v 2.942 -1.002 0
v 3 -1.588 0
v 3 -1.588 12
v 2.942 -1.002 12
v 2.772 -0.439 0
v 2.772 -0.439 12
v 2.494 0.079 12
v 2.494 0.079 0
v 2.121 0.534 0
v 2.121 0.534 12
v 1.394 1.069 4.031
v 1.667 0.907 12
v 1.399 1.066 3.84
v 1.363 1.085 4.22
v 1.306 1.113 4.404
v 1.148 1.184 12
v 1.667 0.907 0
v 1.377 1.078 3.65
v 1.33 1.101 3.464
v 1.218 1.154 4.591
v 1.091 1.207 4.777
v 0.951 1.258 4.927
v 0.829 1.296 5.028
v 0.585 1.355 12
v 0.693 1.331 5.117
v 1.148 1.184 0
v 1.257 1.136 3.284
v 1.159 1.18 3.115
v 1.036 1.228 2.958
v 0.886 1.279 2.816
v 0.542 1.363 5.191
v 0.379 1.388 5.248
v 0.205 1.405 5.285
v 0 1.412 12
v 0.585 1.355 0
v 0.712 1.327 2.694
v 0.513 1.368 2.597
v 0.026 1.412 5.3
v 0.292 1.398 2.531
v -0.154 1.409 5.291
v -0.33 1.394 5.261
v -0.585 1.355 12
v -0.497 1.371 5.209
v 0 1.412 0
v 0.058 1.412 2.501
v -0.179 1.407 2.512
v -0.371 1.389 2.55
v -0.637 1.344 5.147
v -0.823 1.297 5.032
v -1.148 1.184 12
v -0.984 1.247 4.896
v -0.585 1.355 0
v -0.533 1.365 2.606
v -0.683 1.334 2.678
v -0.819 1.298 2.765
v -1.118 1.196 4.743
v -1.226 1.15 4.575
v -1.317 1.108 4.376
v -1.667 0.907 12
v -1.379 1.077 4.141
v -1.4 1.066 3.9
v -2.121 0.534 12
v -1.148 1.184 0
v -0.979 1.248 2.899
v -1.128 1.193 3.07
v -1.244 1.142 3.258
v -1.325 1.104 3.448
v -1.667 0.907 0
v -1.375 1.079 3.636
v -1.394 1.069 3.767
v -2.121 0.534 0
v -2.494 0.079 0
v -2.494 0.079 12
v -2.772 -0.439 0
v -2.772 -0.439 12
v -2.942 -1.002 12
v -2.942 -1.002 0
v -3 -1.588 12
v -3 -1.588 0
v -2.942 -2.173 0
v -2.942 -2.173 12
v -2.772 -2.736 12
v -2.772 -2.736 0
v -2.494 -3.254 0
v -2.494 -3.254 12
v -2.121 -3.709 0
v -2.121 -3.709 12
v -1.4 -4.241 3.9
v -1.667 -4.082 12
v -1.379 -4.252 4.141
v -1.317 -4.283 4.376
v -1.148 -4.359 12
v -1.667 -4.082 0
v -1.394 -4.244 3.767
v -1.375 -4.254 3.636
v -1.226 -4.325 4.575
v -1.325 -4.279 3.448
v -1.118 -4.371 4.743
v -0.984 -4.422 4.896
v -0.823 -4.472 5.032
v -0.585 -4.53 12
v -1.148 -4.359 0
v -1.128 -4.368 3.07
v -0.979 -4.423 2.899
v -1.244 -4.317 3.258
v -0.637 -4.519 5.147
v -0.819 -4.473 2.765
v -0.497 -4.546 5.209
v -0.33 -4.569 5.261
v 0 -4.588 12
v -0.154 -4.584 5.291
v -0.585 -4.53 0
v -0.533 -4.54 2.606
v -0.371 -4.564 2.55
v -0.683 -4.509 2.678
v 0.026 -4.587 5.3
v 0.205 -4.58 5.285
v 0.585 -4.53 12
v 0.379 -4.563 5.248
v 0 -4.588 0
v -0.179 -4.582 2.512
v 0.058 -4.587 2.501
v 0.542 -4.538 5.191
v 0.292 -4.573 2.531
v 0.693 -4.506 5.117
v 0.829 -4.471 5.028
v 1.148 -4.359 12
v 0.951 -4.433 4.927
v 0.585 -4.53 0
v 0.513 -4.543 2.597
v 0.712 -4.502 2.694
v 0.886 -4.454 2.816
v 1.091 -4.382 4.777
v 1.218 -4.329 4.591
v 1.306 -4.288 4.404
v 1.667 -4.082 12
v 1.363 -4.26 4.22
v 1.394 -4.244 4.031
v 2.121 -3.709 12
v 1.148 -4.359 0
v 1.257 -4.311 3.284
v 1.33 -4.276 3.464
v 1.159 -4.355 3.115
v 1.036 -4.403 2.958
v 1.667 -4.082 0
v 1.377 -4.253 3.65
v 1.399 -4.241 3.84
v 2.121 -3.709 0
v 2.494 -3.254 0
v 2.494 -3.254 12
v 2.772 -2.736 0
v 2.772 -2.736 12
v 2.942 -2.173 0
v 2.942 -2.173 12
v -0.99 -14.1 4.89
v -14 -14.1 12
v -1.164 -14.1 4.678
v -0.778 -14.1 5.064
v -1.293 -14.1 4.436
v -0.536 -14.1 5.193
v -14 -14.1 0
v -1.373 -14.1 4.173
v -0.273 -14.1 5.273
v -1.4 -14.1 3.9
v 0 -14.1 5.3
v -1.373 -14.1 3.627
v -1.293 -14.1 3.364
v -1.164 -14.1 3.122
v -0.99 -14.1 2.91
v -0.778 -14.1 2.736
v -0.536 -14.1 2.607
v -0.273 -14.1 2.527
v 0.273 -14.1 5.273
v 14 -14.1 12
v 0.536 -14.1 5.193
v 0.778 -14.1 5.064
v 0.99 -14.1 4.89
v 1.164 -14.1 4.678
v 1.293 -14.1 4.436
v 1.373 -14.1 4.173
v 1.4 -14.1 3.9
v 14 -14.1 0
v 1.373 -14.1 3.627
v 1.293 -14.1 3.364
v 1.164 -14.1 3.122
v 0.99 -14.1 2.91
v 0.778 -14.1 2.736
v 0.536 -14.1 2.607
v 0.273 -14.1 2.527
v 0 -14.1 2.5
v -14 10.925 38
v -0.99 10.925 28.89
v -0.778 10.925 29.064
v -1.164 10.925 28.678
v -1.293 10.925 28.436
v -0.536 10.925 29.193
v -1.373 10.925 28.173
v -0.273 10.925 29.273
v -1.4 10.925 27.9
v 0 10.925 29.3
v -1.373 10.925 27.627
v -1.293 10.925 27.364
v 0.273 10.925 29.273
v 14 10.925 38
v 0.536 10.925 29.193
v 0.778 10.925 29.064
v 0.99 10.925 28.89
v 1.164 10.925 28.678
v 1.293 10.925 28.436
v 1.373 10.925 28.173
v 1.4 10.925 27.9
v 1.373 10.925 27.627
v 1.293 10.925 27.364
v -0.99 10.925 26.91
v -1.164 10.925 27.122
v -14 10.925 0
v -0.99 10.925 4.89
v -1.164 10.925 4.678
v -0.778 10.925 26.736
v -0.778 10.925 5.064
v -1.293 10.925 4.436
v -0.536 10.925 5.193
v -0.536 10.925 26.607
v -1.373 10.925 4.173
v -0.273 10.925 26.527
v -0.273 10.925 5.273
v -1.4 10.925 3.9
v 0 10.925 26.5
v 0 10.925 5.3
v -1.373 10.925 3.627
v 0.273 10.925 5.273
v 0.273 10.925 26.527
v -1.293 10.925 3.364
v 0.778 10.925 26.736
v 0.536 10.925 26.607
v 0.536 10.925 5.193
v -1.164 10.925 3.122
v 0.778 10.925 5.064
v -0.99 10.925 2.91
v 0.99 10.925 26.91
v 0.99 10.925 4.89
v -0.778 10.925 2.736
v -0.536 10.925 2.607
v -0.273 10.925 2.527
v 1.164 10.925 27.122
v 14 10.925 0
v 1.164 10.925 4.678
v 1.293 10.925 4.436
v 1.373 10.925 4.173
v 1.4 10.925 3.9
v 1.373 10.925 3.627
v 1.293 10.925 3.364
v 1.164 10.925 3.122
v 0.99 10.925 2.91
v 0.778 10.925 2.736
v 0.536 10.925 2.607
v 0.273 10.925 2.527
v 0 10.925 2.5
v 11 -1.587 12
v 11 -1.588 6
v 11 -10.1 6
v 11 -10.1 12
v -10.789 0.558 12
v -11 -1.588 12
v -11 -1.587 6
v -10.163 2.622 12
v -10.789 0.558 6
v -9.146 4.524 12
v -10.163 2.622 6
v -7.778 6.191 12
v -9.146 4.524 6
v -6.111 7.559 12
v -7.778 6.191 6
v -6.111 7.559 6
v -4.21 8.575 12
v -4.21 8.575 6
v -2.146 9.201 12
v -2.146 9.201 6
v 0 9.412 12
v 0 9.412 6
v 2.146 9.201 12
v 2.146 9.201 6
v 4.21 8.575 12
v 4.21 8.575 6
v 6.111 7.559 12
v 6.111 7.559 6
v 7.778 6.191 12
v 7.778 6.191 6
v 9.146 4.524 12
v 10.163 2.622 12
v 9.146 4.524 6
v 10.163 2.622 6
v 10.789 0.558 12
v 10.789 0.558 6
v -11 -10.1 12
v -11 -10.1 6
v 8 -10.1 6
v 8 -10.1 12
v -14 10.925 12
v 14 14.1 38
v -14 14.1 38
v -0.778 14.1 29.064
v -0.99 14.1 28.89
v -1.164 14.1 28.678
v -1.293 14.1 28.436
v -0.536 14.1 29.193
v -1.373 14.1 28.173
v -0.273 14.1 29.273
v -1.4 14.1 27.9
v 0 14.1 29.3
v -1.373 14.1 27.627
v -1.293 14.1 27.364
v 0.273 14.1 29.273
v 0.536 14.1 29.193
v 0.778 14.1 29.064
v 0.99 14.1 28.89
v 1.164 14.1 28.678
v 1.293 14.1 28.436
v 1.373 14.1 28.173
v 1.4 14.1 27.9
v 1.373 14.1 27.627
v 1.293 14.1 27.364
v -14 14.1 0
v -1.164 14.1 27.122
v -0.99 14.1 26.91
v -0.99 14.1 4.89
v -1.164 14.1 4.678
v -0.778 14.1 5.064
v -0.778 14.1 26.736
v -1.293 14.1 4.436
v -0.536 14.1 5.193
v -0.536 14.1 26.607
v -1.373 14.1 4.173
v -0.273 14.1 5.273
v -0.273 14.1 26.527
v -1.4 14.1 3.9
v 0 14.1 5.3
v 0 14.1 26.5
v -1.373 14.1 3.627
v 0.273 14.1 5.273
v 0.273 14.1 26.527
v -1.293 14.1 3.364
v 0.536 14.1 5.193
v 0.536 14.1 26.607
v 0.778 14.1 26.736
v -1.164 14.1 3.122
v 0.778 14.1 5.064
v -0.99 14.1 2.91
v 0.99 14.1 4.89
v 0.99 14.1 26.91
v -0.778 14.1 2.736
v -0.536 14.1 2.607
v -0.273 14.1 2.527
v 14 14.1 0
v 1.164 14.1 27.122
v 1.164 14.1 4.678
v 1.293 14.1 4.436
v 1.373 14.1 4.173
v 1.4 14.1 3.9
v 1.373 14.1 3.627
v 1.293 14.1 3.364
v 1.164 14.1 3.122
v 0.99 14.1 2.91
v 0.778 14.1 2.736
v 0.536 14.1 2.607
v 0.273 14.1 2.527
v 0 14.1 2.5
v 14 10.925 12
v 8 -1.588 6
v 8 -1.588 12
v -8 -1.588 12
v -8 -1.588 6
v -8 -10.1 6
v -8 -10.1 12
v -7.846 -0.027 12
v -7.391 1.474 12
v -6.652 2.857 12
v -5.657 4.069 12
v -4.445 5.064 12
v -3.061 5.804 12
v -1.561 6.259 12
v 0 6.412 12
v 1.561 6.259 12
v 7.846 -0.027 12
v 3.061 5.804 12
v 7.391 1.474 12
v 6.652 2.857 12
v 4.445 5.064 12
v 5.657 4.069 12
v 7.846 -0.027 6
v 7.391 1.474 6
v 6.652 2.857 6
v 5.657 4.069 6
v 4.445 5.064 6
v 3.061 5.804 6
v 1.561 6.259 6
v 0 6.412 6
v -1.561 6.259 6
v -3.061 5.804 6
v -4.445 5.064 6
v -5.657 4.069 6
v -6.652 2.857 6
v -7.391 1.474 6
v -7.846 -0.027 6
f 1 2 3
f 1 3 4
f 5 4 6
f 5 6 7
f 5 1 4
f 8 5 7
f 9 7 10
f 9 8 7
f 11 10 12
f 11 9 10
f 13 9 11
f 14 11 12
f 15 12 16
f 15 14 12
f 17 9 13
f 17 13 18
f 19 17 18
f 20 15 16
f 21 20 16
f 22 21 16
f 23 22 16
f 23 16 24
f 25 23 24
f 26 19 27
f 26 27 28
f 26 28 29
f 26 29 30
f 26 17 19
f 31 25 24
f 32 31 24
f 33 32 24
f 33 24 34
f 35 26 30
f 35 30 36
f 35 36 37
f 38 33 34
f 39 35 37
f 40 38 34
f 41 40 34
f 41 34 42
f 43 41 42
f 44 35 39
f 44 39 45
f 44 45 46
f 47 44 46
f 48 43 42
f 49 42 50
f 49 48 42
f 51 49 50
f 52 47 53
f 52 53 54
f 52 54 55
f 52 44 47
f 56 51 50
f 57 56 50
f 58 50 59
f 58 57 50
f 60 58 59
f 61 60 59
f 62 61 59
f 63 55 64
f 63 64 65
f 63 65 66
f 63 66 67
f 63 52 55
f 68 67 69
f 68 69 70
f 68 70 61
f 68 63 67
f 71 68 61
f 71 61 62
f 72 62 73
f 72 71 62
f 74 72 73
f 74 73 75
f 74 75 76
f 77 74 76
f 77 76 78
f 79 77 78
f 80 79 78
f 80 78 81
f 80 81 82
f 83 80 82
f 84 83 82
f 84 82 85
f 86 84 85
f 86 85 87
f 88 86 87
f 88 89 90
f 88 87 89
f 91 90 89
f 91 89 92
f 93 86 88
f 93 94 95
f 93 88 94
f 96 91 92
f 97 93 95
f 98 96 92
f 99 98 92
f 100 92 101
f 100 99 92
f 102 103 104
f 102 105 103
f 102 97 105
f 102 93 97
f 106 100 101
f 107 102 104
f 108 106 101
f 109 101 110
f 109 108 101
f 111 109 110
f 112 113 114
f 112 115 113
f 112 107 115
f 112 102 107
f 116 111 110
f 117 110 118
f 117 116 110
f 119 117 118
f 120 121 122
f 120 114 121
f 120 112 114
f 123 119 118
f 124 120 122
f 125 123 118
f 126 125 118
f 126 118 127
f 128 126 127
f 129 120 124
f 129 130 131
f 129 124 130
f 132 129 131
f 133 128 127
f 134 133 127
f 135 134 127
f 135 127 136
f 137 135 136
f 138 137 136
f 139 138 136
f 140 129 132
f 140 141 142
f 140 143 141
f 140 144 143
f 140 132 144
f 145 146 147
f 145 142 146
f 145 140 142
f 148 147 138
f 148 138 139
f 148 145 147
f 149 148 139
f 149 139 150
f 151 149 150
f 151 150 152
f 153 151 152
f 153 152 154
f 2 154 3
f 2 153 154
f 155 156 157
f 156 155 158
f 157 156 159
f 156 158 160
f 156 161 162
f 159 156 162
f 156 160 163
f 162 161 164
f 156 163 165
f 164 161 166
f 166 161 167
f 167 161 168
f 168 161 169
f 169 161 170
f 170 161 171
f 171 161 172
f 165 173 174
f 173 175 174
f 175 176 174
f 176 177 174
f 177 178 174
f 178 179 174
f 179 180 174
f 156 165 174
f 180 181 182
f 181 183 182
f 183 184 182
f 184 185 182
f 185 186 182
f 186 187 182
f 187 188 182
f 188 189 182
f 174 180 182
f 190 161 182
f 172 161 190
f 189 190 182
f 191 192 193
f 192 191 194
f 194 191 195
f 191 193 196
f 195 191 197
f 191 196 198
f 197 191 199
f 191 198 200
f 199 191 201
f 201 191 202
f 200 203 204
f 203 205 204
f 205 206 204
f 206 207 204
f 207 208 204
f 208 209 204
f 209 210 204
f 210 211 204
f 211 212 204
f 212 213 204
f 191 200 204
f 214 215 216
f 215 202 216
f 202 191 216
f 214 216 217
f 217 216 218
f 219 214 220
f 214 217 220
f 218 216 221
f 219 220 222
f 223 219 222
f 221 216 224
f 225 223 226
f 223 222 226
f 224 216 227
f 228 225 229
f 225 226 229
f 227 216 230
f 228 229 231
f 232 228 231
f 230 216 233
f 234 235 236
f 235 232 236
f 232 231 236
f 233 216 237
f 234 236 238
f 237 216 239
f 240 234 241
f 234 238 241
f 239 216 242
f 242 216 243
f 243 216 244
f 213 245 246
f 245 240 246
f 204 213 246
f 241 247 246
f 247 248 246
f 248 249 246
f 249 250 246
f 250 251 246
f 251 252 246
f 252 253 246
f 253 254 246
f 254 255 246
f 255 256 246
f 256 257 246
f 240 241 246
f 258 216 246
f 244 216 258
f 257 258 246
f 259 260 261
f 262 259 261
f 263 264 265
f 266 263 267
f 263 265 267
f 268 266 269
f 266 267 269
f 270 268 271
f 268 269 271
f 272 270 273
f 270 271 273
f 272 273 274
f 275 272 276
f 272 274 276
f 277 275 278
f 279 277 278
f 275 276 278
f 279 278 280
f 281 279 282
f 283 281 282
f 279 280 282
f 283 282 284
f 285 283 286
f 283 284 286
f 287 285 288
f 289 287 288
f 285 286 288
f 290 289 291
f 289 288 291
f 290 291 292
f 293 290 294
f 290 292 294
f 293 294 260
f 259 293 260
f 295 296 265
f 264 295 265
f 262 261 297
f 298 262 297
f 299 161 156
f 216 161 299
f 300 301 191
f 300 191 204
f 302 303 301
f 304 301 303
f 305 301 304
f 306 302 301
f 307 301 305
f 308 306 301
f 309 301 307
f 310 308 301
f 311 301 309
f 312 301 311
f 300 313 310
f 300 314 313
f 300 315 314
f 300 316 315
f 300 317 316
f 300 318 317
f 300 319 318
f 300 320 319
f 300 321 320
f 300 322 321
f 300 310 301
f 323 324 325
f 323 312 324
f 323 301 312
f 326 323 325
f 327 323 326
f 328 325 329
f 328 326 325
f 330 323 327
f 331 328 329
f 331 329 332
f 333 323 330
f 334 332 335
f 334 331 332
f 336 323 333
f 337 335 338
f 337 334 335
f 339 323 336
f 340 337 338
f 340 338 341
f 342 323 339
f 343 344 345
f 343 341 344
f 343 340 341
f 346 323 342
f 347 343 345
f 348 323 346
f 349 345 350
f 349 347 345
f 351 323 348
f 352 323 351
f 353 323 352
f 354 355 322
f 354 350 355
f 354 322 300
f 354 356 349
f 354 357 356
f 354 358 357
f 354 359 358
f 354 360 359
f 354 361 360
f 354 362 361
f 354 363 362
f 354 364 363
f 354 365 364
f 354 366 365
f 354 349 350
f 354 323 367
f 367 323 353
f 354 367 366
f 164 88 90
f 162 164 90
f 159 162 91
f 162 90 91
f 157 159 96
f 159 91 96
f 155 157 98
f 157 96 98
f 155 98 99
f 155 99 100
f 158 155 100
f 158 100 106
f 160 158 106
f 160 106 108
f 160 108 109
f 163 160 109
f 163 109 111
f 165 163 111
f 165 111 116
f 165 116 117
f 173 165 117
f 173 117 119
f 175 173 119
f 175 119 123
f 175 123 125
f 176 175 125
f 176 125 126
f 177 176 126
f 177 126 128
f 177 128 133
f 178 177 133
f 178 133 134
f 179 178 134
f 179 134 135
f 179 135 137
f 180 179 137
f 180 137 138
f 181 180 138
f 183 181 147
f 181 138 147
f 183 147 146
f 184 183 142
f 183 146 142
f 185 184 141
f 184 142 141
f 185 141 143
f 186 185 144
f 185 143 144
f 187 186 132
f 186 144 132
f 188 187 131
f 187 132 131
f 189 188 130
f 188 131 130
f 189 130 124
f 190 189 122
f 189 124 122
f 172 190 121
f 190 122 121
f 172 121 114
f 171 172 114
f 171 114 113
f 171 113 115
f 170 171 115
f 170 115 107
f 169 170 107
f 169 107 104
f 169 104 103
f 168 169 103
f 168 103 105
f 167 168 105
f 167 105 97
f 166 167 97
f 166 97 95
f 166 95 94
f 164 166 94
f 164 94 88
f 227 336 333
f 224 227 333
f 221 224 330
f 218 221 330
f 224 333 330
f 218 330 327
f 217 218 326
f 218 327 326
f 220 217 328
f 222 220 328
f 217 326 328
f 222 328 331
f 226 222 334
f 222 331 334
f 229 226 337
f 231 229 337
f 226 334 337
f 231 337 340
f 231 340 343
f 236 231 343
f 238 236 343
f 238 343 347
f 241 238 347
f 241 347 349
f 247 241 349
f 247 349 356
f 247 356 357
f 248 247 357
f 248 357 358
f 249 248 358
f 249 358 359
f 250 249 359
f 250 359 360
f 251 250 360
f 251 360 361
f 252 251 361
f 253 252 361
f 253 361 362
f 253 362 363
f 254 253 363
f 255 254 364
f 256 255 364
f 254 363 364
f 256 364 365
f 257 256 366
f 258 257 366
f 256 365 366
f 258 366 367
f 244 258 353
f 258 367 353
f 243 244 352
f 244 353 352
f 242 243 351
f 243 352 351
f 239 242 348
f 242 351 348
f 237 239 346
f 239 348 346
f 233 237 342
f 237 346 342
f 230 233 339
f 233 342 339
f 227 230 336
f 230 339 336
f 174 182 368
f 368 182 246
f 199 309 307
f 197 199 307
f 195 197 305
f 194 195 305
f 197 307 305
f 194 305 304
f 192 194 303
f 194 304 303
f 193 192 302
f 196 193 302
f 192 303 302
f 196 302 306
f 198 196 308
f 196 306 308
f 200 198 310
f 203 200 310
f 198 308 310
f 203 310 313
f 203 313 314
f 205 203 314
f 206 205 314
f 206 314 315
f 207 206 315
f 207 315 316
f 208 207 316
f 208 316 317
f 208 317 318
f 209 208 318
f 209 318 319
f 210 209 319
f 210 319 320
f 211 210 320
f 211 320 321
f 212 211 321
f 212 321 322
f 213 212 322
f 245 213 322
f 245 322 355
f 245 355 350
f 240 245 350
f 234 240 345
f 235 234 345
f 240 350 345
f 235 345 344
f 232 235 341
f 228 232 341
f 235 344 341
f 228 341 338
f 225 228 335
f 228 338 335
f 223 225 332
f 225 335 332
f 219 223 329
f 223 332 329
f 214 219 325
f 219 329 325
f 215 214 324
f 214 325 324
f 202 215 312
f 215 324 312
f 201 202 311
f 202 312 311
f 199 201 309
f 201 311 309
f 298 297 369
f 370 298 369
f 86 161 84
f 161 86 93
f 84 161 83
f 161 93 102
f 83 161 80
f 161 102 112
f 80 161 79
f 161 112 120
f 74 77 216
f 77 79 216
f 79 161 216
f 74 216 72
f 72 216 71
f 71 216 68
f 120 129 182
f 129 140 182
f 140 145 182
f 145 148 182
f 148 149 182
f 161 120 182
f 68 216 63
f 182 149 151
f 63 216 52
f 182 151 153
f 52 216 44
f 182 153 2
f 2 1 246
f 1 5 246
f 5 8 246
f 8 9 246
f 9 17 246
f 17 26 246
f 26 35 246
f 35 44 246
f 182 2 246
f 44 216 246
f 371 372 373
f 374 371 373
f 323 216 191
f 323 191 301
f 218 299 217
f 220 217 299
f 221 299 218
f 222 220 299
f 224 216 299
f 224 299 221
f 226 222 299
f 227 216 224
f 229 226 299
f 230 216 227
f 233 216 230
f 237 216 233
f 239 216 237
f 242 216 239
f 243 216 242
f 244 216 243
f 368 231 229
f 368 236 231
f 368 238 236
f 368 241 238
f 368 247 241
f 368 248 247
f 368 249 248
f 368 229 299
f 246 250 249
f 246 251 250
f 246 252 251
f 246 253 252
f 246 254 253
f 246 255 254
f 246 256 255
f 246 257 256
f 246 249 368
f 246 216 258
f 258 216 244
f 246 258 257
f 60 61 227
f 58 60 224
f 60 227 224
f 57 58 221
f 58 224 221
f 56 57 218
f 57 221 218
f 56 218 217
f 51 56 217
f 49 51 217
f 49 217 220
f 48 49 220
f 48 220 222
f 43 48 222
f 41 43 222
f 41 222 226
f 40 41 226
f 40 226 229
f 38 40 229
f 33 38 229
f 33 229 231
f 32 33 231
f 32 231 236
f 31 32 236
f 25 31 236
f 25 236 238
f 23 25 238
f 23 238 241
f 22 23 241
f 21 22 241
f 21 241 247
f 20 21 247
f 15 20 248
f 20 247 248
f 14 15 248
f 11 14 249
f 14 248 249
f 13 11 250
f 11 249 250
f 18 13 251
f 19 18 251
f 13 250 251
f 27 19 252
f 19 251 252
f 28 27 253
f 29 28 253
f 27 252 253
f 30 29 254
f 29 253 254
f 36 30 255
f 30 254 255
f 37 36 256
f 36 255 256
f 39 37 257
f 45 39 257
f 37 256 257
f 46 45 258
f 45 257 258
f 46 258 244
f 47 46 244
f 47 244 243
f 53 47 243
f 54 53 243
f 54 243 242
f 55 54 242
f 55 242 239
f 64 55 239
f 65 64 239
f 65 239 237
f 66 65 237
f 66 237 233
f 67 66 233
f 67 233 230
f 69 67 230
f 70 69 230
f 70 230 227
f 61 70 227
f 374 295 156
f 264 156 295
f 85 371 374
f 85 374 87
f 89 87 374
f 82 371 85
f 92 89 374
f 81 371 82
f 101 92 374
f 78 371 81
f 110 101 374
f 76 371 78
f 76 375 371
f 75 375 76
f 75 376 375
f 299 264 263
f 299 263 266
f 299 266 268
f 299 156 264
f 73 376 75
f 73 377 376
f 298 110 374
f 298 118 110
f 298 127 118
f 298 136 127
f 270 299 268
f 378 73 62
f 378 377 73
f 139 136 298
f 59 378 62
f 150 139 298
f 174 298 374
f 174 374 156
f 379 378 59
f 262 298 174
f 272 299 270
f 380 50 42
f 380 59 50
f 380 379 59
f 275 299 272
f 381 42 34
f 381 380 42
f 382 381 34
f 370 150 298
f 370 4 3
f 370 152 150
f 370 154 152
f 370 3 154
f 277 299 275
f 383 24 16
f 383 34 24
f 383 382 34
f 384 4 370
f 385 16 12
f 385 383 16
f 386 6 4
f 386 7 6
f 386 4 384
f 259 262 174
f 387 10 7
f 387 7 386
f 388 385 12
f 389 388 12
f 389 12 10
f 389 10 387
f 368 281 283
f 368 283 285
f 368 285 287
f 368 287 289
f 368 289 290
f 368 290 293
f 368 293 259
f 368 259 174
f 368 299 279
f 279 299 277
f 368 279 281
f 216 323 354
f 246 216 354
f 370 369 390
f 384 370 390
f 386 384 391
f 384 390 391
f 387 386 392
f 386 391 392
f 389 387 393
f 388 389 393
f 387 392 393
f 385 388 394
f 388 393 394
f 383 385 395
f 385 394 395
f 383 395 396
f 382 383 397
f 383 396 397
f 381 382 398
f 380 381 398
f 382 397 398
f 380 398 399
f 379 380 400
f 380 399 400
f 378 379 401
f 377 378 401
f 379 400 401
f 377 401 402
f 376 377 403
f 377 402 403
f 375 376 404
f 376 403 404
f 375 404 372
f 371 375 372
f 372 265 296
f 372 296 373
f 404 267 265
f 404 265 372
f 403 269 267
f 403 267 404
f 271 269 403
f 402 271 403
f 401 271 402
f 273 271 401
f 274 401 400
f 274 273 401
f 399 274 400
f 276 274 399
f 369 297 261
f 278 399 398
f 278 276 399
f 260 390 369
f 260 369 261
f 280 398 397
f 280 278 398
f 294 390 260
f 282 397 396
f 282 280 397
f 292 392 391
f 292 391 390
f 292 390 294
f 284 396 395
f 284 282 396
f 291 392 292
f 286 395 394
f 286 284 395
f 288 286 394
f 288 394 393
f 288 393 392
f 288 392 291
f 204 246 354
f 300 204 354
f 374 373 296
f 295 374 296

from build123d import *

# Parameters (mm, degrees)
F0_W     = 28
F0_H     = 25.025
F0_R     = 3
F1_DEPTH = 12
F2_DEPTH = 6
F0_H_2   = 3.175
F3_DEPTH = 38
F4_R     = 1.4
F5_DEPTH = 28.201


with BuildPart() as f1:
    # F0 (on Top) → F1 (new body)
    with BuildSketch(Plane.XY):
        with Locations((0, -1.5875)):
            Rectangle(F0_W, F0_H)
        with Locations((0, -1.5875)):
            Circle(F0_R, mode=Mode.SUBTRACT)
        with BuildLine():
            Line((-11, -10.1), (-11, -1.5875))
            ThreePointArc((-11, -1.5875), (0, 9.4125), (11, -1.5875))
            Line((11, -1.5875), (11, -10.1))
            Line((11, -10.1), (8, -10.1))
            Line((8, -10.1), (8, -1.5875))
            ThreePointArc((8, -1.5875), (0, 6.4125), (-8, -1.5875))
            Line((-8, -1.5875), (-8, -10.1))
            Line((-8, -10.1), (-11, -10.1))
        make_face(mode=Mode.SUBTRACT)
    extrude(amount=F1_DEPTH)

    # F0 (on Top) → F2 (join)
    with BuildSketch(Plane.XY):
        with BuildLine():
            ThreePointArc((11, -1.5875), (0, 9.4125), (-11, -1.5875))
            Line((-11, -1.5875), (-11, -10.1))
            Line((-11, -10.1), (-8, -10.1))
            Line((-8, -10.1), (-8, -1.5875))
            ThreePointArc((-8, -1.5875), (0, 6.4125), (8, -1.5875))
            Line((8, -1.5875), (8, -10.1))
            Line((8, -10.1), (11, -10.1))
            Line((11, -10.1), (11, -1.5875))
        make_face()
    extrude(amount=F2_DEPTH)


with BuildPart() as f3:
    # F0 (on Top) → F3 (new body)
    with BuildSketch(Plane.XY):
        with Locations((0, 12.5125)):
            Rectangle(F0_W, F0_H_2)
    extrude(amount=F3_DEPTH)


with BuildPart() as f5_tool:
    # F4 (on face) → F5 (new body, through all)
    with BuildSketch(Plane(origin=(0, 14.1, 0), x_dir=(-1, 0, 0), z_dir=(0, 1, 0))):
        with Locations((0, 27.9)):
            Circle(F4_R)
        with Locations((0, 3.9)):
            Circle(F4_R)
    extrude(amount=-F5_DEPTH)


with BuildPart() as f1_1:
    add(f1.part)

    # F5: cut by f5_tool
    add(f5_tool.part, mode=Mode.SUBTRACT)


with BuildPart() as f3_1:
    add(f3.part)

    # F5: cut by f5_tool
    add(f5_tool.part, mode=Mode.SUBTRACT)


solid = Compound([f1_1.part, f3_1.part])
